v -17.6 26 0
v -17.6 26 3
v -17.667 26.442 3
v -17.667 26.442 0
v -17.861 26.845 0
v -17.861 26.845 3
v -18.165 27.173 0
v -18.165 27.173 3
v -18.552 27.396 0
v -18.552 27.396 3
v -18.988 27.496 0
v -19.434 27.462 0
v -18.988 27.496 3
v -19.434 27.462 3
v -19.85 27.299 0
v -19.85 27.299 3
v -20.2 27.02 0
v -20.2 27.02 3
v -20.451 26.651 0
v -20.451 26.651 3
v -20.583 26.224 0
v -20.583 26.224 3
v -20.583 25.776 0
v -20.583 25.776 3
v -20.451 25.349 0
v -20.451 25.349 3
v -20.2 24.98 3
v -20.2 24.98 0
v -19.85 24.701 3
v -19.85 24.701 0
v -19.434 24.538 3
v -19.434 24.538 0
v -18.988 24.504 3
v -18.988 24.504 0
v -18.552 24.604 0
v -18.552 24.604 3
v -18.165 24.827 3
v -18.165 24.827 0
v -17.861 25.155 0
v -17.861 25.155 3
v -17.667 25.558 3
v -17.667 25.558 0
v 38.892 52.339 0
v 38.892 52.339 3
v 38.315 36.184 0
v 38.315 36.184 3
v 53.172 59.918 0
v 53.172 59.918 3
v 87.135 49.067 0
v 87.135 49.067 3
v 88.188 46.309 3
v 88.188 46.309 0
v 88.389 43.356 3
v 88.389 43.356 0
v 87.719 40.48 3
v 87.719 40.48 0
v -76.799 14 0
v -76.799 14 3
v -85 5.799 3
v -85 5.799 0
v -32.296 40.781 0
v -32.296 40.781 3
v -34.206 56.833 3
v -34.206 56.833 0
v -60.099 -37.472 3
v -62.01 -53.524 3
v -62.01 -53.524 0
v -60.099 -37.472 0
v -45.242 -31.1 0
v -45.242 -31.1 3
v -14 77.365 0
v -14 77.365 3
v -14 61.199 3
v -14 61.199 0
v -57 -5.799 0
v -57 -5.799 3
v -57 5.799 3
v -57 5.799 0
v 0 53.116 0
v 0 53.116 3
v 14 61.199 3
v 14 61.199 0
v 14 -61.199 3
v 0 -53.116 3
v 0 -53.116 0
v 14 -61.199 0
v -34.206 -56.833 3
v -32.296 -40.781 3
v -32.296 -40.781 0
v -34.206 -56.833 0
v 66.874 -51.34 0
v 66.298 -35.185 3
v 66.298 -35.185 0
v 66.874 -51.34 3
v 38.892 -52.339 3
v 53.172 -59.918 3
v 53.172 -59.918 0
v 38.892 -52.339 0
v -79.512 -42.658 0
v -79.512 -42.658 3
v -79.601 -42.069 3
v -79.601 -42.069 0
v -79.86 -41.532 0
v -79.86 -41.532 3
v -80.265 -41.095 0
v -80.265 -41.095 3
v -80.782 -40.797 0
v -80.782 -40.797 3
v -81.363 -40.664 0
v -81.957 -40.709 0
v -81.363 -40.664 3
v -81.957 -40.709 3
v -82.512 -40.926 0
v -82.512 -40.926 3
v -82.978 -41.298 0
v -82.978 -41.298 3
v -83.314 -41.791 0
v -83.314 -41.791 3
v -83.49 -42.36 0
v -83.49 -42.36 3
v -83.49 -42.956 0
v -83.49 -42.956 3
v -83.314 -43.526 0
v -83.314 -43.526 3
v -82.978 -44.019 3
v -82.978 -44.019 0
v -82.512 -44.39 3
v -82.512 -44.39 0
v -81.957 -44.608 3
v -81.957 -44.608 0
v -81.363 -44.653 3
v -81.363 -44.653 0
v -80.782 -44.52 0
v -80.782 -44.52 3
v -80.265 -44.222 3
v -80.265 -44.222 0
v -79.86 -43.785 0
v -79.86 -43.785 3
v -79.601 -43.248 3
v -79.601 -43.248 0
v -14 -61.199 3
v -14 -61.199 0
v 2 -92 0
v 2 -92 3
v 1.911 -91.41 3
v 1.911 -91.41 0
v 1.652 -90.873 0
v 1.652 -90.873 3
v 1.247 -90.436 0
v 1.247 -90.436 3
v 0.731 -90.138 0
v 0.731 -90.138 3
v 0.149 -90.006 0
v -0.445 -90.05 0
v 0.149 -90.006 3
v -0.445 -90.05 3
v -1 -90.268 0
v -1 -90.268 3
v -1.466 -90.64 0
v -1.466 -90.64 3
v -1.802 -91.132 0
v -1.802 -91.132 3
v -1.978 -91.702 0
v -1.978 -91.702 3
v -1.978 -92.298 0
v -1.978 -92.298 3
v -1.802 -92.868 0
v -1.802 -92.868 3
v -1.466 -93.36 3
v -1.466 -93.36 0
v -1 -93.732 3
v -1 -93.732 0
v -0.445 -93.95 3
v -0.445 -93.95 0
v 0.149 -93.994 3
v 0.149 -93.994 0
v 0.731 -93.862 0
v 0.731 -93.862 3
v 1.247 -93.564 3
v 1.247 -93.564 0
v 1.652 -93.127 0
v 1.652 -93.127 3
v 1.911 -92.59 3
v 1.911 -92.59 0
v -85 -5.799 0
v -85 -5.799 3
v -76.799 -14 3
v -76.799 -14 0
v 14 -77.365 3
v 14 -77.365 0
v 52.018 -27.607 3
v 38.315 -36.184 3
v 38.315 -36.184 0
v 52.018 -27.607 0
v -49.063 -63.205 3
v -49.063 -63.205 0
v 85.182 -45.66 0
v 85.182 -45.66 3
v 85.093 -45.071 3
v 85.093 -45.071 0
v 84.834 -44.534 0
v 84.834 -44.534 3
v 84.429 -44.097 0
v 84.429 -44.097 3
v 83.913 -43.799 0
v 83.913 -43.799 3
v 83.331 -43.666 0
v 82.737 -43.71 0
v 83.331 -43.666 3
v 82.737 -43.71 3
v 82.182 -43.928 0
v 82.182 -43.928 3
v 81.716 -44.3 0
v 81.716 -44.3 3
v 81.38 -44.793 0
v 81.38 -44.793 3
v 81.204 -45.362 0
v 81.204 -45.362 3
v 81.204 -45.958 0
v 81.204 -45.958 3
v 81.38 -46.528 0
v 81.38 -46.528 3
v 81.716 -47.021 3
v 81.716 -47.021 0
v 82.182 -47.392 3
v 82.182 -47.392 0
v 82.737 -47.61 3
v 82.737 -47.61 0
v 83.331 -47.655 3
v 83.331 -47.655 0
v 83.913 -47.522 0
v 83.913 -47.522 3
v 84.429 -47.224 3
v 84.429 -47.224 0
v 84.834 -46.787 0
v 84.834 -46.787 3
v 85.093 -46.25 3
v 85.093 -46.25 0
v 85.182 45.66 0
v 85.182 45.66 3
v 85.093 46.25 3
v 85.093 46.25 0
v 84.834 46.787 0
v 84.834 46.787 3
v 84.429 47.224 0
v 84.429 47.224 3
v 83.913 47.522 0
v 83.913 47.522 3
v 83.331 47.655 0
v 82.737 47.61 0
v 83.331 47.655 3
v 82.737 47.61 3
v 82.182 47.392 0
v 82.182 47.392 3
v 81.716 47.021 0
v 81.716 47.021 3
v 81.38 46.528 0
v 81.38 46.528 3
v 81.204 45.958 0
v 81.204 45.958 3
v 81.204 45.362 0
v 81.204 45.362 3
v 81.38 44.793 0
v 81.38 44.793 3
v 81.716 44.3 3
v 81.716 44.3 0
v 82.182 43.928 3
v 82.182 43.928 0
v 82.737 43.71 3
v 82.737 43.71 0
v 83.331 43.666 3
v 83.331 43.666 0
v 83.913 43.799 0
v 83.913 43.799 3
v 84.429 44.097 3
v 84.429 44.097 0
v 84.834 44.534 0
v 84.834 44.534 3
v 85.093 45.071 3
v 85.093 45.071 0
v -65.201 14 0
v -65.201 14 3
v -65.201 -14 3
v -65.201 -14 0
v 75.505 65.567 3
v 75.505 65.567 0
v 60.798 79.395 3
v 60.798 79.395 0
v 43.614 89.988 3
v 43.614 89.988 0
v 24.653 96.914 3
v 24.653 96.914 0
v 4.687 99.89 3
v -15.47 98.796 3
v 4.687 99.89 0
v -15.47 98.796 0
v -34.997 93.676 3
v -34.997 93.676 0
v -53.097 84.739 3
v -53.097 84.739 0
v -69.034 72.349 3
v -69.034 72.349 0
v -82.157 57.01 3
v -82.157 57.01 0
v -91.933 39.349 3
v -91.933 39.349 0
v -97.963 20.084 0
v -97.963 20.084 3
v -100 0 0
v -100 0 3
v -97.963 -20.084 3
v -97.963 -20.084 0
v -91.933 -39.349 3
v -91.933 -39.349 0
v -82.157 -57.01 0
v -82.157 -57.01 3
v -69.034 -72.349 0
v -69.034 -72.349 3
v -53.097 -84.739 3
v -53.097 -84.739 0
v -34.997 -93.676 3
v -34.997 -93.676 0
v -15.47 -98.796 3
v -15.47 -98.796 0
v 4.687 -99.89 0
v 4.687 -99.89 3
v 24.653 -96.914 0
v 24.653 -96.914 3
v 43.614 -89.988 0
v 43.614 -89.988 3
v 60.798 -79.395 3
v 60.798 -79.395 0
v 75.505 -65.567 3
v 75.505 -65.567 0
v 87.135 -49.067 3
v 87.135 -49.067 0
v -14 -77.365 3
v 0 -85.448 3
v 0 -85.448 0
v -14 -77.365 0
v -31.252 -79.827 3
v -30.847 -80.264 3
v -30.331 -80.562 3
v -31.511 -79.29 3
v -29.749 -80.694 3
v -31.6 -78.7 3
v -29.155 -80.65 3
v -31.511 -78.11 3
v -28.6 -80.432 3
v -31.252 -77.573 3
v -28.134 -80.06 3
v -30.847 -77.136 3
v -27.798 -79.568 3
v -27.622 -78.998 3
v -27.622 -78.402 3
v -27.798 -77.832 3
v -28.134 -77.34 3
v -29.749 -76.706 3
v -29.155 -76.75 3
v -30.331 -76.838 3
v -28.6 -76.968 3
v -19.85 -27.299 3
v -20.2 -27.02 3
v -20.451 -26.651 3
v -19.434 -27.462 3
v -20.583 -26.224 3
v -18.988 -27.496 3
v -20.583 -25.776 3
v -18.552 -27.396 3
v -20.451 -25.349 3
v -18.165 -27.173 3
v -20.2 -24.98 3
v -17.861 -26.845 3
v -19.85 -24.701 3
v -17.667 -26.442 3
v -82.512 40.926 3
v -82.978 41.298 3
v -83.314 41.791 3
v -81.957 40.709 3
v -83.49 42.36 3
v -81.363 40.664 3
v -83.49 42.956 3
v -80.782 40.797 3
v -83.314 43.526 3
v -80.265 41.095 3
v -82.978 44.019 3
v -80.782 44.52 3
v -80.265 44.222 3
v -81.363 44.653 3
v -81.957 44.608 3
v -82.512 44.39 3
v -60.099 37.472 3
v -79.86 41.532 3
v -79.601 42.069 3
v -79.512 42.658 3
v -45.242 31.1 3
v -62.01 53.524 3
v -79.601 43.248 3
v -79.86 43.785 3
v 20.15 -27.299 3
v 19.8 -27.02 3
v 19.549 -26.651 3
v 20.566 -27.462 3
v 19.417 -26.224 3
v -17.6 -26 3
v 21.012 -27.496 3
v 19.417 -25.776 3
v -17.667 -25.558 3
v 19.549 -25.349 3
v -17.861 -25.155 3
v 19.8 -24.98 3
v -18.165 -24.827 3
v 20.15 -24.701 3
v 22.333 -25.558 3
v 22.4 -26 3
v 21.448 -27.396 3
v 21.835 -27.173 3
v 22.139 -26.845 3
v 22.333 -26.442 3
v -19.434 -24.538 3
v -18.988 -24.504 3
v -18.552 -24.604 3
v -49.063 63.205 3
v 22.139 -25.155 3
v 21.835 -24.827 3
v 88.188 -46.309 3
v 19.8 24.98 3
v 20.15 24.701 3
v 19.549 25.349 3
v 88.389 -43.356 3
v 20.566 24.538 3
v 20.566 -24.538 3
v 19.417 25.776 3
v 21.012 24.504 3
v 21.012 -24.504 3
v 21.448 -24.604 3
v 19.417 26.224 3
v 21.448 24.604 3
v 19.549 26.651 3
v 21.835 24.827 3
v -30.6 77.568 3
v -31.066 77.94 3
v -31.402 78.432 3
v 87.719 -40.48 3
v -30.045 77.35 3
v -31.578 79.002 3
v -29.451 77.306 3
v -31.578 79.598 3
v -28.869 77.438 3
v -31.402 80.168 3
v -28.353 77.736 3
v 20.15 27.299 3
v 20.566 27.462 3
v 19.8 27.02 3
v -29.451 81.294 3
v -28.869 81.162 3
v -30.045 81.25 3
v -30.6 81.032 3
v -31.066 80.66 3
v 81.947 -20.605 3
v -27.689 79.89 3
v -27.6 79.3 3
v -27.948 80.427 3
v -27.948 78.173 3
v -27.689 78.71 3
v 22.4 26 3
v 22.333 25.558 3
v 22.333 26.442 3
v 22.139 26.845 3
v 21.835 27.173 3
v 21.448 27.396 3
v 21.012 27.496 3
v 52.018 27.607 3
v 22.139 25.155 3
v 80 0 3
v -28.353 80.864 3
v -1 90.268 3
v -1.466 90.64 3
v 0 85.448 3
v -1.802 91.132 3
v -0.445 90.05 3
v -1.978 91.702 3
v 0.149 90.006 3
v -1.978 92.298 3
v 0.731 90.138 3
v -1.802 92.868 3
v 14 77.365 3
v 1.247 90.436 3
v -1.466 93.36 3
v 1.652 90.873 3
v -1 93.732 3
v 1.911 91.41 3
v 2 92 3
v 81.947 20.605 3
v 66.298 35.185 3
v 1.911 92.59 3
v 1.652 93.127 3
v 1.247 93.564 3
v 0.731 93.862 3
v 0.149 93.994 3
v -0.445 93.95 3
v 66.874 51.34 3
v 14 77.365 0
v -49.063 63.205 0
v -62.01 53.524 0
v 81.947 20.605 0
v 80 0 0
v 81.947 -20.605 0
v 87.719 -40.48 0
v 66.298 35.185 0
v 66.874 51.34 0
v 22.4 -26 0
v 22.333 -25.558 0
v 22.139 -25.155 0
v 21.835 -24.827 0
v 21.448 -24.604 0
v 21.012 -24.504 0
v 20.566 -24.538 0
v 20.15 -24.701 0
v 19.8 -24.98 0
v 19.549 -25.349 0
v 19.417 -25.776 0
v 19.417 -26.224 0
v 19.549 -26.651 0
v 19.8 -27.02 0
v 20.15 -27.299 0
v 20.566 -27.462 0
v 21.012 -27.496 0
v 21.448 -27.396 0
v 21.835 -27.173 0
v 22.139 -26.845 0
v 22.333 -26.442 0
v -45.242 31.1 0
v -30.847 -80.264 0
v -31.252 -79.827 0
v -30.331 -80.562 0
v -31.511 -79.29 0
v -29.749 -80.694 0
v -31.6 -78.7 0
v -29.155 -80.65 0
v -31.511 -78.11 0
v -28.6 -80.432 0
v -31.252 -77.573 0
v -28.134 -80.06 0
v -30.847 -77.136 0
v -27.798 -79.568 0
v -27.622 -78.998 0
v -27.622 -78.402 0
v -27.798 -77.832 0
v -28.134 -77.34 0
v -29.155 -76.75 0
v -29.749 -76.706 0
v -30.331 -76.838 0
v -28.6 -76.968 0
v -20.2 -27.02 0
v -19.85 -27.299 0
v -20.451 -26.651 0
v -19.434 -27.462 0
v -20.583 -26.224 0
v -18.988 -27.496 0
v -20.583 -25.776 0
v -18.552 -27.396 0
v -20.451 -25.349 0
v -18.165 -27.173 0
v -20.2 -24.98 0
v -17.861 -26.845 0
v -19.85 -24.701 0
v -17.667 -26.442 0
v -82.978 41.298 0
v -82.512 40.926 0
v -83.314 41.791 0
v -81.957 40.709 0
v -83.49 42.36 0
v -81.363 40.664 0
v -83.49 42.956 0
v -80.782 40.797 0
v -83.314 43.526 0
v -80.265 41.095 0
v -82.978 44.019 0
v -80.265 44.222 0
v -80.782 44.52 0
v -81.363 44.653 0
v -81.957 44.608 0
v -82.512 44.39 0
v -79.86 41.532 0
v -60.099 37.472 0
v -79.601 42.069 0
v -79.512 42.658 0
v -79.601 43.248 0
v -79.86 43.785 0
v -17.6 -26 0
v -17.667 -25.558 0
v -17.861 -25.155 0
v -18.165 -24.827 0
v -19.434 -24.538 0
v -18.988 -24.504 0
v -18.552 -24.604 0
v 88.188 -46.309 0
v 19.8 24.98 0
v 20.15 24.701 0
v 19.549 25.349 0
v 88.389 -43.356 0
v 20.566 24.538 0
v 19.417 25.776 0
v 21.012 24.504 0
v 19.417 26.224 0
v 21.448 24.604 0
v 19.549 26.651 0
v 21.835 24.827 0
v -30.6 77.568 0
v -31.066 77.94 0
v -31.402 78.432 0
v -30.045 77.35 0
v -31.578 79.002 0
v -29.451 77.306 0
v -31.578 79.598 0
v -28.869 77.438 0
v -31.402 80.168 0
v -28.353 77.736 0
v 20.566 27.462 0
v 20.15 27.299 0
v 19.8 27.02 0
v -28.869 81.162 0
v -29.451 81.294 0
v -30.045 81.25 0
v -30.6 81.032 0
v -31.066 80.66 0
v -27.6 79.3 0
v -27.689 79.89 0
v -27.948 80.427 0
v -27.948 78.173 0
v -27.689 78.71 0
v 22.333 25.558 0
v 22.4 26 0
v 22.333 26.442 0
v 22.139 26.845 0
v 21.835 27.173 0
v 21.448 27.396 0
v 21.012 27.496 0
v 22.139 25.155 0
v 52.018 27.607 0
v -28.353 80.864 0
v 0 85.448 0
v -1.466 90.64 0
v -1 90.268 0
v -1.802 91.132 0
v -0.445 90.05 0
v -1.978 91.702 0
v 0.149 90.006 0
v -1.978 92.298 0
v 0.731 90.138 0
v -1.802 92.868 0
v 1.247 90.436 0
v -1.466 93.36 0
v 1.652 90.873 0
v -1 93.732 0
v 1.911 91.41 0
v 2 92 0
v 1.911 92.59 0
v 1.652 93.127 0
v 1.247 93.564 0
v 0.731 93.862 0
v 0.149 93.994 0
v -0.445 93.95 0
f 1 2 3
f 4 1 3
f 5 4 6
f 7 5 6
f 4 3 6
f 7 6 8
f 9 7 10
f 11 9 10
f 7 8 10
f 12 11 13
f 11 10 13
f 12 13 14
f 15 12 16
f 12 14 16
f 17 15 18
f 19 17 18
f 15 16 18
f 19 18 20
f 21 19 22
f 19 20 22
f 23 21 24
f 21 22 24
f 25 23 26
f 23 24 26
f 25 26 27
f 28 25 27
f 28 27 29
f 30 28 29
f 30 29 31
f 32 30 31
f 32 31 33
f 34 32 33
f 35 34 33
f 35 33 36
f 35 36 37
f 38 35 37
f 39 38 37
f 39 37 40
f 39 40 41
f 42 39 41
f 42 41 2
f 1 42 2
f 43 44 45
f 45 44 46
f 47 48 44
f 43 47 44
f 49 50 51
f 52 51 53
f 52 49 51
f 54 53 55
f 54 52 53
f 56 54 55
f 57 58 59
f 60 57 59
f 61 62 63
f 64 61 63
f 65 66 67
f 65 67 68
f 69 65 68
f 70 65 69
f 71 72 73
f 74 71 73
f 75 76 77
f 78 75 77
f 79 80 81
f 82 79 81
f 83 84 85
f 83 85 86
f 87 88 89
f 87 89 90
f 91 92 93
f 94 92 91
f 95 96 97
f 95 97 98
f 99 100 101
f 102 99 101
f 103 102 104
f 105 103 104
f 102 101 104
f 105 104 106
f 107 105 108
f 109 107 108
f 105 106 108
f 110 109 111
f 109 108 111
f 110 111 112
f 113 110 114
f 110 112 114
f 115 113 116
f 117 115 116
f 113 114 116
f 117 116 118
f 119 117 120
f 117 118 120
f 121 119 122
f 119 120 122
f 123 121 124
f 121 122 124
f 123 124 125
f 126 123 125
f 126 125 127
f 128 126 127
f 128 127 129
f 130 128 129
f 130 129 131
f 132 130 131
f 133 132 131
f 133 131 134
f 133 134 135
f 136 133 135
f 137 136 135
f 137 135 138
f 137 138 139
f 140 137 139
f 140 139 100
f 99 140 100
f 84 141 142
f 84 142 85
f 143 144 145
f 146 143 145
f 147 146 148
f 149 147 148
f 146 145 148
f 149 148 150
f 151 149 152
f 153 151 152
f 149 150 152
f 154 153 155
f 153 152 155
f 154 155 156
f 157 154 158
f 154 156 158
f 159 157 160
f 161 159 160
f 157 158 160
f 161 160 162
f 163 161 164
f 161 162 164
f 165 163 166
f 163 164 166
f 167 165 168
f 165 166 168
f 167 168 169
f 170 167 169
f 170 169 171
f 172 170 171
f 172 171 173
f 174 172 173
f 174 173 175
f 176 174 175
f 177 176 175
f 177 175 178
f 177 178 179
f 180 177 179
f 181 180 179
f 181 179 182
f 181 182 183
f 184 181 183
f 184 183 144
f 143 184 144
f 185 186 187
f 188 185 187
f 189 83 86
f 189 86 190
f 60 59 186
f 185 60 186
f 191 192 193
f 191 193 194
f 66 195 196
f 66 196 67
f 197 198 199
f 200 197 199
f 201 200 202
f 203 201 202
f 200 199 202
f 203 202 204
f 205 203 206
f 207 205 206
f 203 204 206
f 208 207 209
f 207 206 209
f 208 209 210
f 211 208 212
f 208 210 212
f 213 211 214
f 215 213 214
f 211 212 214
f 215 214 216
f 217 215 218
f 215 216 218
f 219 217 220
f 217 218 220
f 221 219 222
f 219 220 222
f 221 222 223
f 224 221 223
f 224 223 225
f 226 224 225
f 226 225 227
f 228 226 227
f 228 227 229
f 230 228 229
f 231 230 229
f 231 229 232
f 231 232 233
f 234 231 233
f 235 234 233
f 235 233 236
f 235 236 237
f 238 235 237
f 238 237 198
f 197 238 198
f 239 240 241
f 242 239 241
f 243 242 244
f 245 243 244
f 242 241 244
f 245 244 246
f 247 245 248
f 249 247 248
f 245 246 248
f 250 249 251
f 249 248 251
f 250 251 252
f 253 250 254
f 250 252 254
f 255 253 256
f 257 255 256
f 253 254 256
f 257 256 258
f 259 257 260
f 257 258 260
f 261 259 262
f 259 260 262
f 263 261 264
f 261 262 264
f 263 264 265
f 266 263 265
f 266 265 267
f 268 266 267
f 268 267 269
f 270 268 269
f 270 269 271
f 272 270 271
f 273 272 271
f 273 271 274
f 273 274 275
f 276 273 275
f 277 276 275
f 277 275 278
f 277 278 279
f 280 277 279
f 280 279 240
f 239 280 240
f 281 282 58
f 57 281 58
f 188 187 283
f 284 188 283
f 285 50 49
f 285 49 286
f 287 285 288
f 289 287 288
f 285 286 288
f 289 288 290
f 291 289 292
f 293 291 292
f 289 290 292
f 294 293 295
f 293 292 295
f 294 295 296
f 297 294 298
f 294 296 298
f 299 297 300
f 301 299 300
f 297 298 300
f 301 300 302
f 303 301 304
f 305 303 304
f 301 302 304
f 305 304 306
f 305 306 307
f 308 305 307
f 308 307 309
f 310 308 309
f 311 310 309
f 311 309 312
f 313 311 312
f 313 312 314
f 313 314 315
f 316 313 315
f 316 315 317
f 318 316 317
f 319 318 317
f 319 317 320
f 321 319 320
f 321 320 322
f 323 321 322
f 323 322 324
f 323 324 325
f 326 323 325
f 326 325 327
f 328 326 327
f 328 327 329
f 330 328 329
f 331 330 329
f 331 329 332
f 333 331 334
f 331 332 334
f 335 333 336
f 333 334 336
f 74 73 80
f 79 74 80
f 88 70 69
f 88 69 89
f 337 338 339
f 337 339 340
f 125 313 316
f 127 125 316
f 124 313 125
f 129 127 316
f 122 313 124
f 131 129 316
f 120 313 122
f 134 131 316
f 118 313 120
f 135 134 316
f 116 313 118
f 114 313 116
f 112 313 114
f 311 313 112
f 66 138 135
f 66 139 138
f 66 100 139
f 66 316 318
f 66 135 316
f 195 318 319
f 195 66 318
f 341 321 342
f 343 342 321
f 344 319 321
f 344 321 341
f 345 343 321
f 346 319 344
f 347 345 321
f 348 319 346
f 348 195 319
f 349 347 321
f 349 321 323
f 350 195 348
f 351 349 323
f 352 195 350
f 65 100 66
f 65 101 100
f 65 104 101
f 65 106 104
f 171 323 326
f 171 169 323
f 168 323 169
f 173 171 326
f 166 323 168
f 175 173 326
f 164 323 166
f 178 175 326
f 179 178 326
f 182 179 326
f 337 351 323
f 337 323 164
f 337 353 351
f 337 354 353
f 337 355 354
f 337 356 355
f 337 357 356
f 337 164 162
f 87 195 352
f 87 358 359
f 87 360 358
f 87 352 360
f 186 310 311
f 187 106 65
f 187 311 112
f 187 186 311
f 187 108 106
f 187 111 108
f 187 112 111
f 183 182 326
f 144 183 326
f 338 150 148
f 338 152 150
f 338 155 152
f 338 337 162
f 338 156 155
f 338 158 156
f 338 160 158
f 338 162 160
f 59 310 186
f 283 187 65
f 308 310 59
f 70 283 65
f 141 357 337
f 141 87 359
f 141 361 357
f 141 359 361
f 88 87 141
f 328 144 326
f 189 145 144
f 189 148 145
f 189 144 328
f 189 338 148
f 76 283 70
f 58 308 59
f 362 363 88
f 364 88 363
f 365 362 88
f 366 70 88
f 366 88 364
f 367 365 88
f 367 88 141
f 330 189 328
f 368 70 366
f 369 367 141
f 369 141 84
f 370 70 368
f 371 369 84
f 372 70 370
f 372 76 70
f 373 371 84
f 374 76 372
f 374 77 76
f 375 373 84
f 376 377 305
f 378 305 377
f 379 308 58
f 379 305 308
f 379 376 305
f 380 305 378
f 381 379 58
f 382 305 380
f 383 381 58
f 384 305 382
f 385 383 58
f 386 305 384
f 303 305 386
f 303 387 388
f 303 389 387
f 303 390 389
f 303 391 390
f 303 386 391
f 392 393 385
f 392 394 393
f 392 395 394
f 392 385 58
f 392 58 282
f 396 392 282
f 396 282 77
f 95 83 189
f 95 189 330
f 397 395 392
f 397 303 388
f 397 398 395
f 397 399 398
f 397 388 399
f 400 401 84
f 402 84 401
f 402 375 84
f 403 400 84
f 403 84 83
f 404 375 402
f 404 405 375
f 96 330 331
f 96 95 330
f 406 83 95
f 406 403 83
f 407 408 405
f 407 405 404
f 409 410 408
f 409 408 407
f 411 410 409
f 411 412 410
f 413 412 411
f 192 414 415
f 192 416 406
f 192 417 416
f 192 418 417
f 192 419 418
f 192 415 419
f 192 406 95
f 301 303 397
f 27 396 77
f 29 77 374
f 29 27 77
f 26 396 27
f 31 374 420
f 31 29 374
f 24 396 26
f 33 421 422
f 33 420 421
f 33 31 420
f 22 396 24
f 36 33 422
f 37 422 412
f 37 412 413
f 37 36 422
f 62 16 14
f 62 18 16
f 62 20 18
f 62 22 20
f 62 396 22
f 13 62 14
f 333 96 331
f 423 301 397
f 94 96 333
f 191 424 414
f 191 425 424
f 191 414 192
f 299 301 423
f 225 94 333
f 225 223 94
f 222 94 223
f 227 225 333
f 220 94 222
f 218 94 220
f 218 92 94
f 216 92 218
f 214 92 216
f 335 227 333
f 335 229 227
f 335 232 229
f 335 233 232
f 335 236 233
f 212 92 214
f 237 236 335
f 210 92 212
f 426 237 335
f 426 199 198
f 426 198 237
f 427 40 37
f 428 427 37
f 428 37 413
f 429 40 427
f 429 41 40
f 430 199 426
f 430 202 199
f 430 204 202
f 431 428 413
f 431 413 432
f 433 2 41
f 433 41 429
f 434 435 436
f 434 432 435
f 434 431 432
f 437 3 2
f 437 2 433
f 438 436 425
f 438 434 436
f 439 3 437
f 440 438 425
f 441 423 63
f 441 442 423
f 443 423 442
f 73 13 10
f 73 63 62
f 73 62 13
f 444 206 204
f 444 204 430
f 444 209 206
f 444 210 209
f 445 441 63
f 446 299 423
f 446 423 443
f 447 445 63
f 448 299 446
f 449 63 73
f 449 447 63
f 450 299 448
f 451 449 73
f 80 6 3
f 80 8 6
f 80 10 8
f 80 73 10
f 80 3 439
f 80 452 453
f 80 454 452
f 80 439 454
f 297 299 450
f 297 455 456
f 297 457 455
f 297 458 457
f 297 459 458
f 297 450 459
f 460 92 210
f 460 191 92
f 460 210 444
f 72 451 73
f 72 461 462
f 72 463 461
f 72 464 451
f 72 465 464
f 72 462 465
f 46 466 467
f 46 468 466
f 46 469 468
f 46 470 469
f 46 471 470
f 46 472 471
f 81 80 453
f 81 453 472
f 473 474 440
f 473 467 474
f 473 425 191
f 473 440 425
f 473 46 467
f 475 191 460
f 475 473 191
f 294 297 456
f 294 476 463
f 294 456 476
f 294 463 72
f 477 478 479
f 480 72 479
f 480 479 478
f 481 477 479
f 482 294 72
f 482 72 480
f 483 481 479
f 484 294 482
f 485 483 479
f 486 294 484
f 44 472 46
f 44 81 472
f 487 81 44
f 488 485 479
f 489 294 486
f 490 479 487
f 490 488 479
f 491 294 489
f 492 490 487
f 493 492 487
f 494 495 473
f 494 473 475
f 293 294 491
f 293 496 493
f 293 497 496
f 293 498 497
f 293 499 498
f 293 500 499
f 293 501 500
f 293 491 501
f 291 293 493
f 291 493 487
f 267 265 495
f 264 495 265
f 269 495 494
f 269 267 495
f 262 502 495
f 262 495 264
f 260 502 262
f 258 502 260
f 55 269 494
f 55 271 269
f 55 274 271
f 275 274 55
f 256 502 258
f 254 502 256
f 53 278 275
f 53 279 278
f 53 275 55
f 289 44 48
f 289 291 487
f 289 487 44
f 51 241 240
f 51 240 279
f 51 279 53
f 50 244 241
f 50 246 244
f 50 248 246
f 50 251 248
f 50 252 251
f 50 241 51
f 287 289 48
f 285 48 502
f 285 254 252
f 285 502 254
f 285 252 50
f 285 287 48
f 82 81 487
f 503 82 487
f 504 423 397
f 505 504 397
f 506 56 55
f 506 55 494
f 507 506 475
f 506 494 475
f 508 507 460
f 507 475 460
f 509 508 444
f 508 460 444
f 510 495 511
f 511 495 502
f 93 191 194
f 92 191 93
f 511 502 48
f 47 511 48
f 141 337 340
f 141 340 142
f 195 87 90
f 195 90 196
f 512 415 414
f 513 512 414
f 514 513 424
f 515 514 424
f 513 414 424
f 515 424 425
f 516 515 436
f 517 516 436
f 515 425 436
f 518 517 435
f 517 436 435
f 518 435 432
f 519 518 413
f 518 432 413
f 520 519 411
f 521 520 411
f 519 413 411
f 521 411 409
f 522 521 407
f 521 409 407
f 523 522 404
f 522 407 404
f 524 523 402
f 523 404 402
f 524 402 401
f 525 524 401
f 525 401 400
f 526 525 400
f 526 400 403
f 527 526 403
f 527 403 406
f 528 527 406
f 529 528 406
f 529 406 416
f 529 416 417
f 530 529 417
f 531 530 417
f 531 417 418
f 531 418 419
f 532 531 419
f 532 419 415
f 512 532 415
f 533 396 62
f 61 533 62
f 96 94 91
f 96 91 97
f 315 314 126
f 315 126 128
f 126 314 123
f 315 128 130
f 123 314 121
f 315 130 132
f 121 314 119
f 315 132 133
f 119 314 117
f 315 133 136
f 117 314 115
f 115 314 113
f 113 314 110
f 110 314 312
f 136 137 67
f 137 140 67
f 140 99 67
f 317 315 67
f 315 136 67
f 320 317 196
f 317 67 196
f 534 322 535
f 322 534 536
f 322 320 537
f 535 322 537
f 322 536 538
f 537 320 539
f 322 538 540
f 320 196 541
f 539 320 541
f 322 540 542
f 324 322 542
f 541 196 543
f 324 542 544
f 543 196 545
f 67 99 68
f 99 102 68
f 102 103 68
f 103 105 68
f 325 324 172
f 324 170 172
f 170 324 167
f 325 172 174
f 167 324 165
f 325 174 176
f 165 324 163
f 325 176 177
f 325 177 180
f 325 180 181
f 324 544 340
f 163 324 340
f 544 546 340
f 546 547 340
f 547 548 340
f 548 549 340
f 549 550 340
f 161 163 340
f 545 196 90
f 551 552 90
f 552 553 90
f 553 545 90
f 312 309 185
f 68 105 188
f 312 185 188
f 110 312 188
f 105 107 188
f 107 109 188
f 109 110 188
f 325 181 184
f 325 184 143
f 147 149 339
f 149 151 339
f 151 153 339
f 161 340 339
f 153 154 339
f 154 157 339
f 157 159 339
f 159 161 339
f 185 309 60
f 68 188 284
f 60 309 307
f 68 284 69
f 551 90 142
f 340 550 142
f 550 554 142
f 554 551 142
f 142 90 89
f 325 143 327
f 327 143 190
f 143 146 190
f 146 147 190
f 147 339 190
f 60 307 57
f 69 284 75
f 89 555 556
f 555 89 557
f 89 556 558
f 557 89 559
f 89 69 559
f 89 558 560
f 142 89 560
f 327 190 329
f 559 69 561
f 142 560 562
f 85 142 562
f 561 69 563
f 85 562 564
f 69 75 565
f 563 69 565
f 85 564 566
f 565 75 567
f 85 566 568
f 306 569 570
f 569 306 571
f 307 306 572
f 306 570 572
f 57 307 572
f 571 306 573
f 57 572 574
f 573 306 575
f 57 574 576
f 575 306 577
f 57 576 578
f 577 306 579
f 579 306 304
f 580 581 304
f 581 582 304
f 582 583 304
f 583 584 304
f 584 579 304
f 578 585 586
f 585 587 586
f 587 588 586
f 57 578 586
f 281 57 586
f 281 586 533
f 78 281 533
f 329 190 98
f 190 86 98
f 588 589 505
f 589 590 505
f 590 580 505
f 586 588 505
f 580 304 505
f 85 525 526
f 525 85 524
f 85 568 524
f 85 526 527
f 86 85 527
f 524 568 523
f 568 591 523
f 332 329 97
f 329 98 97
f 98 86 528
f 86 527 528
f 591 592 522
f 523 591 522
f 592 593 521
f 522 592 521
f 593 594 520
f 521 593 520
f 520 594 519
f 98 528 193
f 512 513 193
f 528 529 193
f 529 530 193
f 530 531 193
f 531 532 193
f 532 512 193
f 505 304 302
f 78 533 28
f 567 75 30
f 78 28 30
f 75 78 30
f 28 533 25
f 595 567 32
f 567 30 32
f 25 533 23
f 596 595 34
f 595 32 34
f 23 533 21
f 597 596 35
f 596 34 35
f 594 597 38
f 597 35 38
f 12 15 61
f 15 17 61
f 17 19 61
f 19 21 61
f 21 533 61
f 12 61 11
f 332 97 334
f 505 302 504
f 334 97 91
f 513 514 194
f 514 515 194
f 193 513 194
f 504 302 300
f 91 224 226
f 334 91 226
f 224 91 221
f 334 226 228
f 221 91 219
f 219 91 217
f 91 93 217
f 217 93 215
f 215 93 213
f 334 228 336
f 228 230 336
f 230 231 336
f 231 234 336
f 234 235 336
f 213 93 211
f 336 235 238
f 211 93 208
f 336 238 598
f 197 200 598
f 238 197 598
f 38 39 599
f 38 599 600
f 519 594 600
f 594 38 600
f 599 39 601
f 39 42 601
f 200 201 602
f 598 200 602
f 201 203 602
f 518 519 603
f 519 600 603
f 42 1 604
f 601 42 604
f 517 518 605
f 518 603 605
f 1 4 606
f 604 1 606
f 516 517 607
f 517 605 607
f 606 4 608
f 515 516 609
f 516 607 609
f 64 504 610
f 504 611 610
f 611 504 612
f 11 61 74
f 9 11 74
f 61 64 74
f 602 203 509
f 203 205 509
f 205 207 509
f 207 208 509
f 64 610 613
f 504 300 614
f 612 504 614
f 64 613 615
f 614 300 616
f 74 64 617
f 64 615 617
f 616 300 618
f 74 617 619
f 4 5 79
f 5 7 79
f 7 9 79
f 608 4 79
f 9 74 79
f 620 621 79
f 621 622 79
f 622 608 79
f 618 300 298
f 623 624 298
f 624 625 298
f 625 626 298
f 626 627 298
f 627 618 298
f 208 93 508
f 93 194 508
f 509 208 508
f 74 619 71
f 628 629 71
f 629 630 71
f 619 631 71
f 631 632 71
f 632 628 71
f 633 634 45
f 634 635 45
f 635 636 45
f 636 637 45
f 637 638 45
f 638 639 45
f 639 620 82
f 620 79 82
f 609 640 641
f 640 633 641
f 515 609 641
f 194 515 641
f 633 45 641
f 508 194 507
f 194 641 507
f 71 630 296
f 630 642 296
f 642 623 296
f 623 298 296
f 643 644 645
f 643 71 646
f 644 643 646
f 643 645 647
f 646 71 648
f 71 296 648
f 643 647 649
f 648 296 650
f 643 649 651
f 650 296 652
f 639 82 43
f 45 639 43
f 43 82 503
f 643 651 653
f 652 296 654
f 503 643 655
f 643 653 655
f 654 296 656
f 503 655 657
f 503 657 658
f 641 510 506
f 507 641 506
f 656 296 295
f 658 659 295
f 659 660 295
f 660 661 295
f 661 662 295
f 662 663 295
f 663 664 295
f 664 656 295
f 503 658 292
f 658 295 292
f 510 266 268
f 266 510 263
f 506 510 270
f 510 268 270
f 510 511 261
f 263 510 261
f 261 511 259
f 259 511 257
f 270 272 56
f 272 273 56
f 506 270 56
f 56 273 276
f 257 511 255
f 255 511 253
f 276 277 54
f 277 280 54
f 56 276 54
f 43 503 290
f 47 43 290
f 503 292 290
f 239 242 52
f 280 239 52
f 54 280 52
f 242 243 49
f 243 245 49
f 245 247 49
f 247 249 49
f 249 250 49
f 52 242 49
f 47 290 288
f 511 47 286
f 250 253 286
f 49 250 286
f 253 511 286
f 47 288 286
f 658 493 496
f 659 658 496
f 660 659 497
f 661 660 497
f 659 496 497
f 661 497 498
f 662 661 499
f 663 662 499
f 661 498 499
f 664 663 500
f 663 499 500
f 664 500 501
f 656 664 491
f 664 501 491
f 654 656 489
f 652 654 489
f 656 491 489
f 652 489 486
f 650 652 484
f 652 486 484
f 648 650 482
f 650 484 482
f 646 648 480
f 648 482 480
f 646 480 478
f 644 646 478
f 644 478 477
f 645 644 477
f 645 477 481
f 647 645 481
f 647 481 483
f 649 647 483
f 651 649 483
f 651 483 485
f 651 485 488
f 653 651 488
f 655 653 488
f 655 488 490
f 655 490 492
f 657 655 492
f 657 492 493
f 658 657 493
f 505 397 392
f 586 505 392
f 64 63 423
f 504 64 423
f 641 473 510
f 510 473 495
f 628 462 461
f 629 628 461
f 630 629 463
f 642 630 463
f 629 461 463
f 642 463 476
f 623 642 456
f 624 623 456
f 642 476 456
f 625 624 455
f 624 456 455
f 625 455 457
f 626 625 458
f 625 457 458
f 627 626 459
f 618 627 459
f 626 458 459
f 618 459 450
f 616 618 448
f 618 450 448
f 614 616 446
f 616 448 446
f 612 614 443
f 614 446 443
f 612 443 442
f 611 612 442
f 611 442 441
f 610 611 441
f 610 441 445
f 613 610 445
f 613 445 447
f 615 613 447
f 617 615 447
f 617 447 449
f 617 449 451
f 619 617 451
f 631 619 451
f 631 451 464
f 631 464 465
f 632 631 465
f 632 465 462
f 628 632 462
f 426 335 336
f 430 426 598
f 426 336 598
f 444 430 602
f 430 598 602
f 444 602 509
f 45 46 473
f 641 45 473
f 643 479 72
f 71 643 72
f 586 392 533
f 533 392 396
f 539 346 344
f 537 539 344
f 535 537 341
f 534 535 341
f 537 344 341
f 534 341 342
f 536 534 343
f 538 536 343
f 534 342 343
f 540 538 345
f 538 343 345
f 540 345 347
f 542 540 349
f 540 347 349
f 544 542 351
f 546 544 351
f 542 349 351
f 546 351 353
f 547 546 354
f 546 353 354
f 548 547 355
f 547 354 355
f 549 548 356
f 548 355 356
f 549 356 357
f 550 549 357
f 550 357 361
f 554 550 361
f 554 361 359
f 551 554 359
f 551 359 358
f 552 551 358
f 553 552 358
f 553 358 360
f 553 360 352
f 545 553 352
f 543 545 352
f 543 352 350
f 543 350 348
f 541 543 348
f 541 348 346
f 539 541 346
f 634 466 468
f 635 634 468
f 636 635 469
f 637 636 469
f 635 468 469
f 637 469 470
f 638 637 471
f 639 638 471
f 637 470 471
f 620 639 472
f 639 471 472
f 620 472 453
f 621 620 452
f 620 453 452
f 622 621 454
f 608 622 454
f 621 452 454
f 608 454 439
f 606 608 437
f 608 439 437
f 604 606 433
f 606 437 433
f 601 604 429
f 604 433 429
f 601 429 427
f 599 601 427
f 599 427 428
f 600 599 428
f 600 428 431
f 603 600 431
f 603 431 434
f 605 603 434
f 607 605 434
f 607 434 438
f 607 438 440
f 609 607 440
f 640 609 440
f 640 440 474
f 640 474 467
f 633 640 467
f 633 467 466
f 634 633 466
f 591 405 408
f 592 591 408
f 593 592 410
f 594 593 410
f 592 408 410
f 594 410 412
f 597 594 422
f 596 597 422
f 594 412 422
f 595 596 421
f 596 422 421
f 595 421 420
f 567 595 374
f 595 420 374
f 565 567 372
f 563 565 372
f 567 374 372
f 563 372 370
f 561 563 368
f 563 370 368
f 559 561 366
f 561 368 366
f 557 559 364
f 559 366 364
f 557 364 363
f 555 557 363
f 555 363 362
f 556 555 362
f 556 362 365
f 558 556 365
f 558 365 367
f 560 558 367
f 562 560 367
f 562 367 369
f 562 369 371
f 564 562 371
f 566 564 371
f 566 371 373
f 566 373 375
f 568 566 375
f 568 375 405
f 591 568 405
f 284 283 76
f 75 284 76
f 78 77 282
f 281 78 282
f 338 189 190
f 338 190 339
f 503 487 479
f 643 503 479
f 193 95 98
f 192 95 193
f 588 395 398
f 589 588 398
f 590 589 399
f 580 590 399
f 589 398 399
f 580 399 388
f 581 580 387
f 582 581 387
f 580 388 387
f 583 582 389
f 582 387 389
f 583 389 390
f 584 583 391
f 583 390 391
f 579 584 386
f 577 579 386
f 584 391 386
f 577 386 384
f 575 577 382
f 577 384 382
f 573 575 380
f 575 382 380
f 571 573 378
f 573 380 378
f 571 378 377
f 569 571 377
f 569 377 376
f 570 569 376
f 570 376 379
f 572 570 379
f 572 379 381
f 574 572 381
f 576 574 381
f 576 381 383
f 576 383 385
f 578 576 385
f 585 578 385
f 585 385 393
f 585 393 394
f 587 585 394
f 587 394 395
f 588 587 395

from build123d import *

# Parameters (mm, degrees)
CROQUIS1_R              = 100
SALIENTE_EXTRUIR1_DEPTH = 3
CROQUIS3_R              = 110
CORTAR_EXTRUIR1_DEPTH   = 3
REDONDEO1_R             = 10
CROQUIS4_R              = 1.5
CORTAR_EXTRUIR2_DEPTH   = 10
CORTAR_EXTRUIR3_DEPTH   = 10
CROQUIS6_R              = 2
CORTAR_EXTRUIR4_DEPTH   = 142.453172607


with BuildPart() as part:
    # Croquis1 → Saliente-Extruir1 (new body)
    with BuildSketch(Plane.XY):
        Circle(CROQUIS1_R)
    extrude(amount=SALIENTE_EXTRUIR1_DEPTH)

    # Croquis3 → Cortar-Extruir1 (cut)
    with BuildSketch(Plane.XY.offset(3)):
        with Locations((190, 0)):
            Circle(CROQUIS3_R)
    extrude(amount=-CORTAR_EXTRUIR1_DEPTH, mode=Mode.SUBTRACT)

    # Redondeo1
    redondeo1_edges = [part.edges().sort_by_distance(p)[0] for p in [
        (89.473684211, -44.659375654, 1.5),
        (89.473684211, 44.659375654, 1.5),
    ]]
    fillet(redondeo1_edges, radius=REDONDEO1_R)

    # Croquis4 → Cortar-Extruir2 (cut)
    with BuildSketch(Plane.XY.offset(3)):
        with Locations((-19.1, -26)):
            Circle(CROQUIS4_R)
        with Locations((20.9, -26)):
            Circle(CROQUIS4_R)
        with Locations((20.9, 26)):
            Circle(CROQUIS4_R)
        with Locations((-19.1, 26)):
            Circle(CROQUIS4_R)
    extrude(amount=-CORTAR_EXTRUIR2_DEPTH, mode=Mode.SUBTRACT)

    # Croquis5 → Cortar-Extruir3 (cut)
    with BuildSketch(Plane.XY.offset(3)):
        Polygon((66.297522474, -35.184824102), (66.874281495, -51.340339642), (53.171574136, -59.917585376), (38.892107757, -52.339315569), (38.315348736, -36.183800029), (52.018056095, -27.606554296), align=None)
        Polygon((14, 61.199128534), (14, 77.364936071), (0, 85.44783984), (-14, 77.364936071), (-14, 61.199128534), (0, 53.116224765), align=None)
        Polygon((-34.205975888, 56.833392886), (-49.063072127, 63.205207751), (-62.009773788, 53.524492414), (-60.099379209, 37.471962211), (-45.24228297, 31.100147347), (-32.295581309, 40.780862684), align=None)
        Polygon((66.874281495, 51.340339642), (53.171574136, 59.917585376), (38.892107757, 52.339315569), (38.315348736, 36.183800029), (52.018056095, 27.606554296), (66.297522474, 35.184824102), align=None)
        Polygon((-57, 5.798989873), (-65.201010127, 14), (-76.798989873, 14), (-85, 5.798989873), (-85, -5.798989873), (-76.798989873, -14), (-65.201010127, -14), (-57, -5.798989873), align=None)
        Polygon((0, -53.116224765), (14, -61.199128534), (14, -77.364936071), (0, -85.44783984), (-14, -77.364936071), (-14, -61.199128534), align=None)
        Polygon((-32.295581309, -40.780862684), (-34.205975888, -56.833392886), (-49.063072127, -63.205207751), (-62.009773788, -53.524492414), (-60.099379209, -37.471962211), (-45.24228297, -31.100147347), align=None)
    extrude(amount=-CORTAR_EXTRUIR3_DEPTH, mode=Mode.SUBTRACT)

    # Croquis6 → Cortar-Extruir4 (cut, through all)
    with BuildSketch(Plane.XY.offset(3)):
        with Locations((0, 92)):
            Circle(CROQUIS6_R)
        with Locations((83.182013697, 45.66031863)):
            Circle(CROQUIS6_R)
        with Locations((83.182013697, -45.66031863)):
            Circle(CROQUIS6_R)
        with Locations((0, -92)):
            Circle(CROQUIS6_R)
        with Locations((-81.512332571, -42.658406426)):
            Circle(CROQUIS6_R)
        with Locations((-81.512332571, 42.658406426)):
            Circle(CROQUIS6_R)
        with Locations((-29.6, -78.7)):
            Circle(CROQUIS6_R)
        with Locations((-29.6, 79.3)):
            Circle(CROQUIS6_R)
    extrude(amount=-CORTAR_EXTRUIR4_DEPTH, mode=Mode.SUBTRACT)


solid = part.part
